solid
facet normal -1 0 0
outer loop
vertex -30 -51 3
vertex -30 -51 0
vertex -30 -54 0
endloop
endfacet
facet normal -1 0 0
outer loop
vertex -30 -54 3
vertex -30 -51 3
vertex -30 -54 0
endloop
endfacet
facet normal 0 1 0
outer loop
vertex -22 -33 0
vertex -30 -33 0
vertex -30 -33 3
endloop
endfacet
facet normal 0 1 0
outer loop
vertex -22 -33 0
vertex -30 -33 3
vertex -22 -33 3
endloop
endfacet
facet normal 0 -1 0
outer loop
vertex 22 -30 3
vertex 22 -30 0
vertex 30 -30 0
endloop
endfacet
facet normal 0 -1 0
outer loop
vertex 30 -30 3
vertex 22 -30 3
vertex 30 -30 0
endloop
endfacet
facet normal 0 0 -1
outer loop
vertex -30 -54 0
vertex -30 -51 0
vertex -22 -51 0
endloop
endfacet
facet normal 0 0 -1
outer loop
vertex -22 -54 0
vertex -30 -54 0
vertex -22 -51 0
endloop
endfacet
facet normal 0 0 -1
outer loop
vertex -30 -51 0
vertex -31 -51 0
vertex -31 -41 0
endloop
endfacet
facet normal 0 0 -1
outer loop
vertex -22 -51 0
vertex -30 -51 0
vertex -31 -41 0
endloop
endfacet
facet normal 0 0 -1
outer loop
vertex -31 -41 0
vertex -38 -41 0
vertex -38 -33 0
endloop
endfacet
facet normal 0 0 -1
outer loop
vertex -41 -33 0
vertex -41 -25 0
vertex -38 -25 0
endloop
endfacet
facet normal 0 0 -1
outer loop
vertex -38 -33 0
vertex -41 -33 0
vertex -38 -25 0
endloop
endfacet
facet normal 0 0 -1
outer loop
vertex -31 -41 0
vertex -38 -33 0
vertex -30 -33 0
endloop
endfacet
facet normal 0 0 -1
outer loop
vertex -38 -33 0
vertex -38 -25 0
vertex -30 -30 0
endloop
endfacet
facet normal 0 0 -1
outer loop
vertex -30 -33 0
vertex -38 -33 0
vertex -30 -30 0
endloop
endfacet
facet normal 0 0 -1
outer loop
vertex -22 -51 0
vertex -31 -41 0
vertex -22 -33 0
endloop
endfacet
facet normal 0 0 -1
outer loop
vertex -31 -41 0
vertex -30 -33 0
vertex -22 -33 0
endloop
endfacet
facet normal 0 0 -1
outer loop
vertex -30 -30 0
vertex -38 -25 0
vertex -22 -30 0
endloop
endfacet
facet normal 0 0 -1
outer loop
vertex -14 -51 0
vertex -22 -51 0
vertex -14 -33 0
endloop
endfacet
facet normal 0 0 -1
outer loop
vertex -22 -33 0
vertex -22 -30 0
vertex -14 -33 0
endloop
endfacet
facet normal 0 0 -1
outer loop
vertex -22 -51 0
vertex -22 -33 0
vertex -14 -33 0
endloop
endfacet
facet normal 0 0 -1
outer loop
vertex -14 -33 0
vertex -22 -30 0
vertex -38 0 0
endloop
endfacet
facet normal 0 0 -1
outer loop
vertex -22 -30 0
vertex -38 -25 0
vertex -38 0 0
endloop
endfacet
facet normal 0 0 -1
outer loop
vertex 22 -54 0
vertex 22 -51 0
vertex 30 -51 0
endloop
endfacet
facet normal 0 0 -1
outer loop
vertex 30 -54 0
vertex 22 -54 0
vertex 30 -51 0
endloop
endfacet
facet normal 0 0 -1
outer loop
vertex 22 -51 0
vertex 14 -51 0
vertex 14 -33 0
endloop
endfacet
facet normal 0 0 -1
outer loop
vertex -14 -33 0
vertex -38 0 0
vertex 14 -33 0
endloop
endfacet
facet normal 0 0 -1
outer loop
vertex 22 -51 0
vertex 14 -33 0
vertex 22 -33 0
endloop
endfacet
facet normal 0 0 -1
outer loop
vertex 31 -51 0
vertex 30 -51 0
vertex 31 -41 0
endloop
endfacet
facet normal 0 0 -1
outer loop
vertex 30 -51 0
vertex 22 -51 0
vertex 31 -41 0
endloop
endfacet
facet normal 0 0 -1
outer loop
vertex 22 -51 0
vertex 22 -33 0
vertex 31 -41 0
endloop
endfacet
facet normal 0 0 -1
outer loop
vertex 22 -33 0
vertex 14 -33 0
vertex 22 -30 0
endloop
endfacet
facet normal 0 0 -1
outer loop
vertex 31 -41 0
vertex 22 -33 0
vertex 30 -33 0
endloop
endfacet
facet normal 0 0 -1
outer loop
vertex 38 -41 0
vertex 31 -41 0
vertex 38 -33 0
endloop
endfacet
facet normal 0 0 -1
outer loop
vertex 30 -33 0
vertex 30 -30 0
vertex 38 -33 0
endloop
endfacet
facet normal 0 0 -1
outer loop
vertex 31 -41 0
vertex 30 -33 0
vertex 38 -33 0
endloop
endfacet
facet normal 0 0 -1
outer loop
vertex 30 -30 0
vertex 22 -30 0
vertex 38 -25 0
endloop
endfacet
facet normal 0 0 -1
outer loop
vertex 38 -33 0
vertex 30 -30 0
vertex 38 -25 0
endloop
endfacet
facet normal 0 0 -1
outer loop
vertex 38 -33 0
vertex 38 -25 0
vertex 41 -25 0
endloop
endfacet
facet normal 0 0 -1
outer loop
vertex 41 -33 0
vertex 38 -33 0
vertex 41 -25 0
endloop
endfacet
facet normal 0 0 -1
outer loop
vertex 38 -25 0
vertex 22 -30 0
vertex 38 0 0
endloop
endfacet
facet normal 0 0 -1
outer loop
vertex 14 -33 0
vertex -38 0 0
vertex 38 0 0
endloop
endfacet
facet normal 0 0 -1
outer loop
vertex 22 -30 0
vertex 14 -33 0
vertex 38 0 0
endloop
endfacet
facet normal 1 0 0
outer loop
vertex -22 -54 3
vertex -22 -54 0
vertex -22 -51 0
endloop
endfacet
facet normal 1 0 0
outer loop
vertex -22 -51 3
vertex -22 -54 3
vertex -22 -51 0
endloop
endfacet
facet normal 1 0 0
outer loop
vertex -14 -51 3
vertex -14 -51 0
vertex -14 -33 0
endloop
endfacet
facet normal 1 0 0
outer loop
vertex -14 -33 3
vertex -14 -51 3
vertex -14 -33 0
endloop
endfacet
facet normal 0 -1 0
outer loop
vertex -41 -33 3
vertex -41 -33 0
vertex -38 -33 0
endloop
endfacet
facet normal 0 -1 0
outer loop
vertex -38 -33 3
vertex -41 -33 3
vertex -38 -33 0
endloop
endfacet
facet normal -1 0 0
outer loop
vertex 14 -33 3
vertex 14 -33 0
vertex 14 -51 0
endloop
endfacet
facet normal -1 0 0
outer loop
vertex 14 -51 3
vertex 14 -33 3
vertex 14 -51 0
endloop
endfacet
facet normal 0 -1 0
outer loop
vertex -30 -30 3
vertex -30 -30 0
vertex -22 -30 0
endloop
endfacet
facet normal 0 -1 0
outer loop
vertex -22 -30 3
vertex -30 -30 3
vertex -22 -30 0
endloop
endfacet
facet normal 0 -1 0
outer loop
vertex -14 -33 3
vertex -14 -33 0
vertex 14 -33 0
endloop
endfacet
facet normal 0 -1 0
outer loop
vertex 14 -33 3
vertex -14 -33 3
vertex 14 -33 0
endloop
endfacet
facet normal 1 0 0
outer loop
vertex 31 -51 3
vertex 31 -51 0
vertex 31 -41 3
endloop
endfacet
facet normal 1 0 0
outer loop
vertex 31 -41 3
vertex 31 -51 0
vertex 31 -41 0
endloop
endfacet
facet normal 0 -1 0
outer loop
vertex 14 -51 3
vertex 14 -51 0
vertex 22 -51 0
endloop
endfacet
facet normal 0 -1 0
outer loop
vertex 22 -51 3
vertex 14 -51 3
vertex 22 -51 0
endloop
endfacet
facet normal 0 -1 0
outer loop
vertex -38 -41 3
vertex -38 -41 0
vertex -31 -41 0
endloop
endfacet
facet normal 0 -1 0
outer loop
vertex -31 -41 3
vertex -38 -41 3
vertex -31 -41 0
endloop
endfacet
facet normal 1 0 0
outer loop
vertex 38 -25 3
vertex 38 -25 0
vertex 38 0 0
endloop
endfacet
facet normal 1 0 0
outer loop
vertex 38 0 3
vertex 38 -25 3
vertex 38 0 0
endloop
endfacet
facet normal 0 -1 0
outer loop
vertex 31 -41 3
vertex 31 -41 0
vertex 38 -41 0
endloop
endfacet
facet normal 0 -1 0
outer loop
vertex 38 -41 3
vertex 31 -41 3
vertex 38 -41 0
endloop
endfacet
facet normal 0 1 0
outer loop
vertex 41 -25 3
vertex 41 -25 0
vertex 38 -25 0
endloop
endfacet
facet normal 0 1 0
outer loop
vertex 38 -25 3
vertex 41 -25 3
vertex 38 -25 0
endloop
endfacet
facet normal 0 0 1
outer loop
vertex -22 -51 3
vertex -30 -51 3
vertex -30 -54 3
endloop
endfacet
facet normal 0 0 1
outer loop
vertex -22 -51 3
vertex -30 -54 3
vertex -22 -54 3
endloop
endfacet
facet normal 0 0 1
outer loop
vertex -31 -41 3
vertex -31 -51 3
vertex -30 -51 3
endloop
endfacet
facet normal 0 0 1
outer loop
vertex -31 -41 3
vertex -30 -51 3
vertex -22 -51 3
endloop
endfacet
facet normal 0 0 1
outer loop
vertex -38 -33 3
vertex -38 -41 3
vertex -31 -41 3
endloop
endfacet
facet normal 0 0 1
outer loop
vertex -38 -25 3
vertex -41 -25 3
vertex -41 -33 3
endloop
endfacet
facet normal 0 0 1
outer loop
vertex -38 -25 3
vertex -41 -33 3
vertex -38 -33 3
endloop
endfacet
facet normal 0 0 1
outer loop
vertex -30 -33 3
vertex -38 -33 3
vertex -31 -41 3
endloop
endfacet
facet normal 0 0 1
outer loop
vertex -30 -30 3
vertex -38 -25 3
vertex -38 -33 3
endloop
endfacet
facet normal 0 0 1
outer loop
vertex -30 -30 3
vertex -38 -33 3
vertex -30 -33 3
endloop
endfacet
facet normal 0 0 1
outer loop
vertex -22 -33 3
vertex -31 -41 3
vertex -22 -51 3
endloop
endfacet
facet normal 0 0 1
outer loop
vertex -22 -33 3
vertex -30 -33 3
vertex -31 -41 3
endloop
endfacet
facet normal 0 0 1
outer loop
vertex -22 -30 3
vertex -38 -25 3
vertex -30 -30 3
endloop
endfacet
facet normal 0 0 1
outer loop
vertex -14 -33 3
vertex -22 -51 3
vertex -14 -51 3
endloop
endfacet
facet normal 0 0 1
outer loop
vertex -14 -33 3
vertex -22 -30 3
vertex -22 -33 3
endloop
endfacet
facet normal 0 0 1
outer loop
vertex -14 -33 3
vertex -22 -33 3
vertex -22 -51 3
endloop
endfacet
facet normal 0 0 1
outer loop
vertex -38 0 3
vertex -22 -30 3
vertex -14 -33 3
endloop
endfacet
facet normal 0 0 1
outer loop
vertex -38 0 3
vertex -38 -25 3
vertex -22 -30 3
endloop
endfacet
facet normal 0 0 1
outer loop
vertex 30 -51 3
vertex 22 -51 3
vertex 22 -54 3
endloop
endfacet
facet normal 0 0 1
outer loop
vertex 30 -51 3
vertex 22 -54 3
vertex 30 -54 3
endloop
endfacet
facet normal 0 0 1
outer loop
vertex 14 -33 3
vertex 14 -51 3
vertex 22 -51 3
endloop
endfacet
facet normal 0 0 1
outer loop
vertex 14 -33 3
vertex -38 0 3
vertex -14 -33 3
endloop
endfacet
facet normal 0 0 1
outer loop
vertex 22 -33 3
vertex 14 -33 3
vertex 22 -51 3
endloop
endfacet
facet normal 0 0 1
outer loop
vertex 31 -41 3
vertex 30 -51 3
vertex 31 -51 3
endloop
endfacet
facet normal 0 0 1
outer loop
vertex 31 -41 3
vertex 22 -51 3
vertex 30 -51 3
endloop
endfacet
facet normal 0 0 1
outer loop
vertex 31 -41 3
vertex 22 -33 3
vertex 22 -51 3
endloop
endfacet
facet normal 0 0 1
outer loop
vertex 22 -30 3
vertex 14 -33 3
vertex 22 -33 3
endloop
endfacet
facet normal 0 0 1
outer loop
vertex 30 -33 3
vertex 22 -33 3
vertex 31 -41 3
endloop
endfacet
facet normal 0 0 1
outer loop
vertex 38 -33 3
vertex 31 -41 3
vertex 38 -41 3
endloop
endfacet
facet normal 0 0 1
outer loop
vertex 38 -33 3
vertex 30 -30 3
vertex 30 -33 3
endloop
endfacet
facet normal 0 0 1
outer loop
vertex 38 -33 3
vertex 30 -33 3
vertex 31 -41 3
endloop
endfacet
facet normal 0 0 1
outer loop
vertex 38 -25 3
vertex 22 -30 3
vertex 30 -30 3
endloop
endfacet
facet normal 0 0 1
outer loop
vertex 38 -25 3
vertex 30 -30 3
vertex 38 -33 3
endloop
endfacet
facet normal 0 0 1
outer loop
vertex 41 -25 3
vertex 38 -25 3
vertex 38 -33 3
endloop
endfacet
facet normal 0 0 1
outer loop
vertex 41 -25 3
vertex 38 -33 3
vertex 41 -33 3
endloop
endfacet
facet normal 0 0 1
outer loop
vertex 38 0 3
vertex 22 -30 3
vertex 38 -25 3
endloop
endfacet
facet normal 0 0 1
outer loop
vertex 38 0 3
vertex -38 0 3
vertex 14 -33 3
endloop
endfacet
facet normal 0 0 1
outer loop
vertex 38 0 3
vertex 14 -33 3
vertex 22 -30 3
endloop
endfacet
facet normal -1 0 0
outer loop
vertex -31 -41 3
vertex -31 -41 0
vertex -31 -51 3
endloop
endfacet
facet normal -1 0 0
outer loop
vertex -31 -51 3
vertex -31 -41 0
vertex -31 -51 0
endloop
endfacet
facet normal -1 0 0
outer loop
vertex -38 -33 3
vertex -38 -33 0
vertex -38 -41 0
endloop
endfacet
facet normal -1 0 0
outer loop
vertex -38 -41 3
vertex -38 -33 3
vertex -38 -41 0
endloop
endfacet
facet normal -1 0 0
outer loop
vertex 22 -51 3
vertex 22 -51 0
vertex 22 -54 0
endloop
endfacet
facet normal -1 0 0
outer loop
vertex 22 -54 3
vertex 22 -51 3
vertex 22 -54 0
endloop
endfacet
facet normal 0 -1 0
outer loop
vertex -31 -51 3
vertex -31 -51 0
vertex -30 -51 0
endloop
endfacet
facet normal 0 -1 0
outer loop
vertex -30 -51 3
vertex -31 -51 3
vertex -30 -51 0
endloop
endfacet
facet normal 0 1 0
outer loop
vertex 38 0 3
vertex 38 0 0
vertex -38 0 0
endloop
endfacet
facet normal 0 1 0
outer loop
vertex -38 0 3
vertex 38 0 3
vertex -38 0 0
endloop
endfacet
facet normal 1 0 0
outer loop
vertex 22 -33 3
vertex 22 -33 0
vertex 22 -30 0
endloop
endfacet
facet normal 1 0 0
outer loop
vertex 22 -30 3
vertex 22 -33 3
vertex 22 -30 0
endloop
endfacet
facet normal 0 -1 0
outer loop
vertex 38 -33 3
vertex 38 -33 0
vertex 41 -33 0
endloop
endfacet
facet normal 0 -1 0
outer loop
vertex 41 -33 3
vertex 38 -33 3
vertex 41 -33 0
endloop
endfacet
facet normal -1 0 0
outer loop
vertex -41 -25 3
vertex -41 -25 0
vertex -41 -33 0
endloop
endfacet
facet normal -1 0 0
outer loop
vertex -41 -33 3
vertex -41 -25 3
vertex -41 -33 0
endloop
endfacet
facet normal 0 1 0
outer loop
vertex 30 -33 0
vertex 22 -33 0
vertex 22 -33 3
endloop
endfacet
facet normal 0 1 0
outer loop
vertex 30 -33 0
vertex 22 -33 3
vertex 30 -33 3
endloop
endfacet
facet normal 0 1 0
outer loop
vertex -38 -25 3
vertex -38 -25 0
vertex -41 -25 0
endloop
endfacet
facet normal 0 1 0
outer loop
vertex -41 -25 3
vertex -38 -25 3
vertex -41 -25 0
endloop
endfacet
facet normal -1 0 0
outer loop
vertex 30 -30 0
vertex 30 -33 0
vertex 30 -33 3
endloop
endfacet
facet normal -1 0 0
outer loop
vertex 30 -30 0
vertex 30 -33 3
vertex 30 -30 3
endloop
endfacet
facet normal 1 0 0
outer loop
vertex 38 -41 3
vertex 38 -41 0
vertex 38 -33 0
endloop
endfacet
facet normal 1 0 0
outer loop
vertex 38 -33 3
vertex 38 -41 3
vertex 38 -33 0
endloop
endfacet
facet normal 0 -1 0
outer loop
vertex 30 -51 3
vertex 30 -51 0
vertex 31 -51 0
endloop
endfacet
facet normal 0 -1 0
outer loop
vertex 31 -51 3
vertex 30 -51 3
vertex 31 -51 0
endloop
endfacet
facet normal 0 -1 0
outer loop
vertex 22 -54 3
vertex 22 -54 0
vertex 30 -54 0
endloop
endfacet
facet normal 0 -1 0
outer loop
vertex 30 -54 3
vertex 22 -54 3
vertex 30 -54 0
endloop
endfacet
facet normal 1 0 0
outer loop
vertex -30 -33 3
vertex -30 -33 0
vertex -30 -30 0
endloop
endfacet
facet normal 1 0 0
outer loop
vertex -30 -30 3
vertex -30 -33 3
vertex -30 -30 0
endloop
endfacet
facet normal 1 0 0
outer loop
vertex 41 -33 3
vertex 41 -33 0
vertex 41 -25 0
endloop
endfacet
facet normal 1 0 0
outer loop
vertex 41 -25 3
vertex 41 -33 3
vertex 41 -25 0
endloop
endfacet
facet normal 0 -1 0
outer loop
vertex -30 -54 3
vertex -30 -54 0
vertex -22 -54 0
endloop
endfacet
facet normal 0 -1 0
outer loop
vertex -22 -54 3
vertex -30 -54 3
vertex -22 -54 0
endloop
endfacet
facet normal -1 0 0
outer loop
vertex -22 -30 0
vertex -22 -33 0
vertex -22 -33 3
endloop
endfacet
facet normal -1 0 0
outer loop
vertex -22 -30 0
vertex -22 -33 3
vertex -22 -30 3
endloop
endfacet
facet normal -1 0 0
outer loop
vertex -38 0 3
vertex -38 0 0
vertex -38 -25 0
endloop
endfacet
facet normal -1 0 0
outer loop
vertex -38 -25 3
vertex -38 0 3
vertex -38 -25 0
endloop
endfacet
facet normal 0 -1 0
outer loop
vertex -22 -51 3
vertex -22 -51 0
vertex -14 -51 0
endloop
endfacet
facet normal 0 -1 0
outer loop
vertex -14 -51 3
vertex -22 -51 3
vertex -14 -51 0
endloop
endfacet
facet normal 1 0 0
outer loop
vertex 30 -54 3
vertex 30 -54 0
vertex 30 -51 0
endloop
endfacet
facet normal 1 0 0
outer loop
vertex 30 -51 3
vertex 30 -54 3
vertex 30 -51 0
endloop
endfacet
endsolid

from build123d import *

# Parameters (mm, degrees)
SKETCH_1_W      = 8
SKETCH_1_H      = 3
EXTRUDE_1_DEPTH = 3


with BuildPart() as part:
    # 草图1 → 凸台-拉伸1 (new body)
    with BuildSketch(Plane.XY):
        Polygon((38, 0), (-38, 0), (-38, -25), (-41, -25), (-41, -33), (-38, -33), (-38, -41), (-31, -41), (-31, -51), (-30, -51), (-30, -54), (-22, -54), (-22, -51), (-14, -51), (-14, -33), (14, -33), (14, -51), (22, -51), (22, -54), (30, -54), (30, -51), (31, -51), (31, -41), (38, -41), (38, -33), (41, -33), (41, -25), (38, -25), align=None)
        with Locations((26, -31.5)):
            Rectangle(SKETCH_1_W, SKETCH_1_H, mode=Mode.SUBTRACT)
        with Locations((-26, -31.5)):
            Rectangle(SKETCH_1_W, SKETCH_1_H, mode=Mode.SUBTRACT)
    extrude(amount=EXTRUDE_1_DEPTH)


solid = part.part
